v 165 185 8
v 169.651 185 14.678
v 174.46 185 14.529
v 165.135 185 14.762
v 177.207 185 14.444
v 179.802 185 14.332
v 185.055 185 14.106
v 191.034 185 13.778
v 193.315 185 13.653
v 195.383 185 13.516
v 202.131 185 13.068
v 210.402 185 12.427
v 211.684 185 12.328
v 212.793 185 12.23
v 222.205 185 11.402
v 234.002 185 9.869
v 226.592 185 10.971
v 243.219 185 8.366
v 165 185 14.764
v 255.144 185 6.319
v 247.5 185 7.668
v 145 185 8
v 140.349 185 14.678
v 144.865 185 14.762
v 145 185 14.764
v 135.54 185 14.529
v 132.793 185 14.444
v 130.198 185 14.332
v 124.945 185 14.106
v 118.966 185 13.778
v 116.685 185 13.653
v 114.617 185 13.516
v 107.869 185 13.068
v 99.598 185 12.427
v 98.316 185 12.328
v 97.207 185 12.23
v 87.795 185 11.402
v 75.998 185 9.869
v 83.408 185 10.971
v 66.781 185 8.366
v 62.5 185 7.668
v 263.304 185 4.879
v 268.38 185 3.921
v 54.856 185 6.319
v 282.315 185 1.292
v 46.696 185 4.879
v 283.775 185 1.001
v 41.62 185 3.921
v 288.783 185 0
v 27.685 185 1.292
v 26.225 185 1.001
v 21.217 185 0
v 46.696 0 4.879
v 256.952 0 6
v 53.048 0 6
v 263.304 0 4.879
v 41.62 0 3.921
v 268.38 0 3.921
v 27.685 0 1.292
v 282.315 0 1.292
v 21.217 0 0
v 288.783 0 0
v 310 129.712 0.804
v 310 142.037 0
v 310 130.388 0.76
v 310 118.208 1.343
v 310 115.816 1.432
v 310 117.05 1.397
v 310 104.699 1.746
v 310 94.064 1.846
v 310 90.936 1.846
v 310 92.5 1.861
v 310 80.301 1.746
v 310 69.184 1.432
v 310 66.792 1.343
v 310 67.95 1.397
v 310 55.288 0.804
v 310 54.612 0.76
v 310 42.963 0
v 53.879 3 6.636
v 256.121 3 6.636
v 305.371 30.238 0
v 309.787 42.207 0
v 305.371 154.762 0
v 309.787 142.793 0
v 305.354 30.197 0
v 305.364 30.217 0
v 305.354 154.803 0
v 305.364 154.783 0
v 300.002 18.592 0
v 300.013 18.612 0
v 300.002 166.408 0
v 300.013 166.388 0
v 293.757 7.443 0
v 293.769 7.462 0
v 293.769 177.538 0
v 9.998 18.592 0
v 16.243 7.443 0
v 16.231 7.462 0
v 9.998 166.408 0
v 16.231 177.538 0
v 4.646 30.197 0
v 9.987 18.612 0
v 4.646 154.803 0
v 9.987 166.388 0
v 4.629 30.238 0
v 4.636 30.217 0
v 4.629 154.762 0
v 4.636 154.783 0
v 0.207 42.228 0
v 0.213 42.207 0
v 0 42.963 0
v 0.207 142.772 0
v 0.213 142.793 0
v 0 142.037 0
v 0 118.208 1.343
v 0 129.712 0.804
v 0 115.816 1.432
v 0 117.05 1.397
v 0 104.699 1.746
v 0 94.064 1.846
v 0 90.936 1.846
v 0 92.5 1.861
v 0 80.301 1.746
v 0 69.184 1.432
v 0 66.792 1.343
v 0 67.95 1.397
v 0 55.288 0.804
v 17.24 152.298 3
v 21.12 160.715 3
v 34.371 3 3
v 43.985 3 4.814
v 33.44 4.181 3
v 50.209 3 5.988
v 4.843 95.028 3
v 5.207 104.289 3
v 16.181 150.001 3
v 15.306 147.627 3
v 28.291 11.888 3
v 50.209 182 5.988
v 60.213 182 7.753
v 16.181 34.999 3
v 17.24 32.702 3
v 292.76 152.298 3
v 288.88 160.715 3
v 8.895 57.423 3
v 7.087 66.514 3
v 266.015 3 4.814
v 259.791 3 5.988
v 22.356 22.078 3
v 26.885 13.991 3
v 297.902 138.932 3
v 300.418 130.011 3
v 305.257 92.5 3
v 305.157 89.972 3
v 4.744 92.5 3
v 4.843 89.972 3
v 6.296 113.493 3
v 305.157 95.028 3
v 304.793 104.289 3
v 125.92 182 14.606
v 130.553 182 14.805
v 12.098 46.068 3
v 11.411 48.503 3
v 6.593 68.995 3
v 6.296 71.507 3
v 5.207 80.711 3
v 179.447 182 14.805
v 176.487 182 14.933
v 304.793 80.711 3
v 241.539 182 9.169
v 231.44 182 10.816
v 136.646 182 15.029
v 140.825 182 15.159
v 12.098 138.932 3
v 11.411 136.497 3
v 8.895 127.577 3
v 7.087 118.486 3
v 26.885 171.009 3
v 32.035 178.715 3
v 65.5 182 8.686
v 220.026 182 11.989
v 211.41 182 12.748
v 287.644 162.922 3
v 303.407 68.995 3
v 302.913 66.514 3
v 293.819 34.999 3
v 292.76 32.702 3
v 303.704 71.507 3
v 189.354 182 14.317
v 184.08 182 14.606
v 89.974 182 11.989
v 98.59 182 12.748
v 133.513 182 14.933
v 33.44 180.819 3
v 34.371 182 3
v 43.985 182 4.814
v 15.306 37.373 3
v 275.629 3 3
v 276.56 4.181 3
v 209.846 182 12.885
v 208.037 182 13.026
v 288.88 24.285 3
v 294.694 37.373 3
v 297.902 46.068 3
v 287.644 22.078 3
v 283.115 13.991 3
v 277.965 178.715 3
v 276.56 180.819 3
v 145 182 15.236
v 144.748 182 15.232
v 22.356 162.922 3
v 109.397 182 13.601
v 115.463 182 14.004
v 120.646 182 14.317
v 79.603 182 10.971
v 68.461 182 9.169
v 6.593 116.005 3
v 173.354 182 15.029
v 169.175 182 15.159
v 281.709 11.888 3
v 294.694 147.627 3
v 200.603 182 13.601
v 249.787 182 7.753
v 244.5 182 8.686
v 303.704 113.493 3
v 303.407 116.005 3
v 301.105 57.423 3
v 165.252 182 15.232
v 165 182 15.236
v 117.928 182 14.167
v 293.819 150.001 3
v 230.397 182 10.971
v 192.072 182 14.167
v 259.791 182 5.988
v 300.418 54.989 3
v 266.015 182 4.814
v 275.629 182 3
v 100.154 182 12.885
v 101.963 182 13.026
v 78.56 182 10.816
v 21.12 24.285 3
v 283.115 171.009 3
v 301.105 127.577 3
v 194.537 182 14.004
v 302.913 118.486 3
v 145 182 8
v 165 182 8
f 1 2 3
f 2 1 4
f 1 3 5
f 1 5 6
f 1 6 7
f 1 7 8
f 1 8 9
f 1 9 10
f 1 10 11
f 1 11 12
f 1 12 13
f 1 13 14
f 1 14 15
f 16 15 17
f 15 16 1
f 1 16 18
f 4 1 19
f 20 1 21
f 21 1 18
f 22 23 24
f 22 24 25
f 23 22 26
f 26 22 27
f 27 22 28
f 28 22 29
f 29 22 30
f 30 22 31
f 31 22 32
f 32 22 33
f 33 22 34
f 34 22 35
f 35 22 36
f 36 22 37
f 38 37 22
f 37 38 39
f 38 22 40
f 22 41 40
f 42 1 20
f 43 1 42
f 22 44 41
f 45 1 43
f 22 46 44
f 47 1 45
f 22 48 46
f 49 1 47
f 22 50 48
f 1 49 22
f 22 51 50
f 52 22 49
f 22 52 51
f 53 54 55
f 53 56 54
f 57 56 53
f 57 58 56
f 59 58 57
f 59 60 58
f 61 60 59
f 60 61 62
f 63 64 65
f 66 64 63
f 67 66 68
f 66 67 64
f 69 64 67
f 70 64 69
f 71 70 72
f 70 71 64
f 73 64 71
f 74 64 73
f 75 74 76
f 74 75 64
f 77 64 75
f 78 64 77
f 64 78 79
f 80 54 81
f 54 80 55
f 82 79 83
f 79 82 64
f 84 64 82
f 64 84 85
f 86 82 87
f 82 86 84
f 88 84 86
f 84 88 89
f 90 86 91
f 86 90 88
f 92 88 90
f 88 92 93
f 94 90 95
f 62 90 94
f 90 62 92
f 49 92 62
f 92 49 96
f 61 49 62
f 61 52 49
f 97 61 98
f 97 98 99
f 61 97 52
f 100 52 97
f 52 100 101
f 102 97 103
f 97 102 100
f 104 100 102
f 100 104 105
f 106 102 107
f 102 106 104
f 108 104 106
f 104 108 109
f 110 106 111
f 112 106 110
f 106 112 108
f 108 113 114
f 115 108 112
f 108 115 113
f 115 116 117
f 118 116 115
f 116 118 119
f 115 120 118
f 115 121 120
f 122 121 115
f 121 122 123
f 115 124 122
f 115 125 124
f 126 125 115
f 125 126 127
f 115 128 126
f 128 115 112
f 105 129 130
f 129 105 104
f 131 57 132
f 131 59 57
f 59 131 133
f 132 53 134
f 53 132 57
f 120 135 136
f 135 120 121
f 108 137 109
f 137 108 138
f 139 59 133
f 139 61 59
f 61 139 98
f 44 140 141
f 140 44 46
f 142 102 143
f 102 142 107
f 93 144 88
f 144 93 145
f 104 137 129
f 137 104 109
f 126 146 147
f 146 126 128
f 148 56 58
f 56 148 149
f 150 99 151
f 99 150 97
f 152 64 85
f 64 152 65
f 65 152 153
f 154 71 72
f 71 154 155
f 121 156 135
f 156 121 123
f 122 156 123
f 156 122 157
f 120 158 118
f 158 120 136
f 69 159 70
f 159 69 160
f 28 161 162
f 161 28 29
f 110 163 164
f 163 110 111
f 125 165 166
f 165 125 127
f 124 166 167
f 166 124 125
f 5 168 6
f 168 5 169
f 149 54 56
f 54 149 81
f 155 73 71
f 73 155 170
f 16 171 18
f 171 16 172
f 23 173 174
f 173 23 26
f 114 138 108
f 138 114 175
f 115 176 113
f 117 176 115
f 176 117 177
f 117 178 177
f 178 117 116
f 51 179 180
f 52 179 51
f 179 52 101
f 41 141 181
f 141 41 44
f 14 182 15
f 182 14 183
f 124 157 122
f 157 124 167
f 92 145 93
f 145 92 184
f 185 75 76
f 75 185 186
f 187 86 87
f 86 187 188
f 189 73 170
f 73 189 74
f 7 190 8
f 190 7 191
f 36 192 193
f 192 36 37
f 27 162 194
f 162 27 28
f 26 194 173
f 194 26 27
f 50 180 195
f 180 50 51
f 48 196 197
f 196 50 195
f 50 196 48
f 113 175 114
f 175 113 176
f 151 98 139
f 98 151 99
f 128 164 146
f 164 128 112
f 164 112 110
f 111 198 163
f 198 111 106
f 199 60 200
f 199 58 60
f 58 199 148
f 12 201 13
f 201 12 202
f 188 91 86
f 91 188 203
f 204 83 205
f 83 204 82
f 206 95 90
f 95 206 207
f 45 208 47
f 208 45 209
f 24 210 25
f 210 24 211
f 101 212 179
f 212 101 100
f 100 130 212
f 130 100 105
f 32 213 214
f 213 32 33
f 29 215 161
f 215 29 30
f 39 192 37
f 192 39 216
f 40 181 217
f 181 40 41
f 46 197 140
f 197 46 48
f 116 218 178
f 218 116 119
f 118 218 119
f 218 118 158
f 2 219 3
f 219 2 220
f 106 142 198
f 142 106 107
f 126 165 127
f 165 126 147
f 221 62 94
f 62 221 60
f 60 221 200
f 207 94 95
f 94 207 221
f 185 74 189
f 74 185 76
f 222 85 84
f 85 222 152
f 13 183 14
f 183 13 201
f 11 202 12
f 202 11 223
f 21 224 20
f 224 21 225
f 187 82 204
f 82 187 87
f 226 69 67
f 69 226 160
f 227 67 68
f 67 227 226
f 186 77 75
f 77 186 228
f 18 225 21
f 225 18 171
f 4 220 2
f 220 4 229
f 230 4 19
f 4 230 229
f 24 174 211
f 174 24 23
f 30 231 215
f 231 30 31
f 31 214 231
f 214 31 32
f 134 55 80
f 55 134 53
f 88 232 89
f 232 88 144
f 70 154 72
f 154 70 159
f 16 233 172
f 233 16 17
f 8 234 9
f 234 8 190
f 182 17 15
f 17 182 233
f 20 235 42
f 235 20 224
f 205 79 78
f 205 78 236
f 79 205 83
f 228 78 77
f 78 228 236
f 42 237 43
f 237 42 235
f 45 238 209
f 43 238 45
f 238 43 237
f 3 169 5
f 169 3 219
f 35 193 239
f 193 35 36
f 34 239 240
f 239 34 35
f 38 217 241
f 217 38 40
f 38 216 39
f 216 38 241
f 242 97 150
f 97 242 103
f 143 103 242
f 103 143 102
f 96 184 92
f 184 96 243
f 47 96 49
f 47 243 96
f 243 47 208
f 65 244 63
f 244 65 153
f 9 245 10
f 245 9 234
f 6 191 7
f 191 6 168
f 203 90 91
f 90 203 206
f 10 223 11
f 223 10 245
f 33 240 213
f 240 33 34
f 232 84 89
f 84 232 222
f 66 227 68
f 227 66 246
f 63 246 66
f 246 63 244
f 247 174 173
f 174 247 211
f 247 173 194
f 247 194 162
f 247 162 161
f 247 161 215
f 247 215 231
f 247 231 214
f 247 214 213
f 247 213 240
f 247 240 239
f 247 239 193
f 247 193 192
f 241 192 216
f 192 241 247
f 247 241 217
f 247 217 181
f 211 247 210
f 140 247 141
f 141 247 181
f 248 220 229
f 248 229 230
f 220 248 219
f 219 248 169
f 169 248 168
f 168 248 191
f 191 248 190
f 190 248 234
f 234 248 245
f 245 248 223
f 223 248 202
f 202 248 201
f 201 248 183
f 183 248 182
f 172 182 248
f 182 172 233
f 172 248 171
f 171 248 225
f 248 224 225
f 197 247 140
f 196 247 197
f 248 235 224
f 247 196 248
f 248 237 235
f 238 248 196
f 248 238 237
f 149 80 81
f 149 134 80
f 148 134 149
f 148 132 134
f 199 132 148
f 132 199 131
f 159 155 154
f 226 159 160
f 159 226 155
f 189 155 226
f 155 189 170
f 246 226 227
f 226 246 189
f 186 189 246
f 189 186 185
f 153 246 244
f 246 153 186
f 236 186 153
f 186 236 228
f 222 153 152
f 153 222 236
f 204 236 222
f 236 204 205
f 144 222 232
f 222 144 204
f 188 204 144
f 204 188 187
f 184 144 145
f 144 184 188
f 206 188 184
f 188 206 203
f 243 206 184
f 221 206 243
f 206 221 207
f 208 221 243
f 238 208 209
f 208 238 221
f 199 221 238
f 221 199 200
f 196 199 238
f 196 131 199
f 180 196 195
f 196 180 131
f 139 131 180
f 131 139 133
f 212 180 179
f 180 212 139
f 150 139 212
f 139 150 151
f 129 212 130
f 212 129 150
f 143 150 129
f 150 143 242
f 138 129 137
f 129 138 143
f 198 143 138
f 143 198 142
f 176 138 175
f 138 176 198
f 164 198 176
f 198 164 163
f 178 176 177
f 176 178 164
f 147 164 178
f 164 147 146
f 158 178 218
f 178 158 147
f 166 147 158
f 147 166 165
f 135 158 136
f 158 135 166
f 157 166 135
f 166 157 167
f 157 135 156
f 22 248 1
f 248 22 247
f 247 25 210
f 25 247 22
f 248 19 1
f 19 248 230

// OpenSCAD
// ============================================================
//  CRAYXUS Guandan Keyboard — Gravity Planet Base
//  重力星球底座 — 带角度键盘托架
//  适配: Bambu A1 (256×256mm), 分左右两半打印
// ============================================================

$fn = 80;

// ===== 键盘尺寸 =====
kb_w       = 290;      // 键盘总宽 (拼合后)
kb_d       = 160;      // 键盘总深
plate_t    = 3.0;      // 定位板厚度

// ===== 底座参数 =====
base_w     = 310;      // 底座宽 (比键盘宽20mm)
base_d     = 185;      // 底座深
tilt_angle = 12;       // 倾斜角度 (度)
base_h_back = 45;      // 后端高度
base_h_front = 6;      // 前端高度 (唇边)
wall       = 3.0;      // 壁厚
lip_h      = 4.0;      // 前唇高度 (防滑)

// ===== 星球曲面 =====
sphere_r   = 600;      // 底面球面半径 (越大越平缓)

// ===== 分割 =====
split_x    = base_w / 2;

// ===== 卡扣 =====
tab_w      = 4.0;
tab_d      = 18.0;
tab_tol    = 0.15;
n_tabs     = 3;

// ===== 派生 =====
side_pad   = (base_w - kb_w) / 2;
front_pad  = (base_d - kb_d) / 2;

// ==========================================================
//  星球底面 — 大球面切割出弧形底
// ==========================================================
module planet_curve(w, d, h) {
    // 用一个大球和长方体的交集做弧形底
    intersection() {
        // 原始楔形
        cube([w, d, h]);
        // 球面 (球心在底面下方)
        translate([w/2, d/2, -sphere_r + h * 0.7])
            sphere(r = sphere_r);
    }
}

// ==========================================================
//  楔形主体 — 前低后高的倾斜托架
// ==========================================================
module wedge_body(w, d) {
    // 后端高, 前端低
    hull() {
        // 前面底边
        translate([0, 0, 0])
            cube([w, 1, base_h_front]);
        // 后面底边
        translate([0, d - 1, 0])
            cube([w, 1, base_h_back]);
    }
}

// ==========================================================
//  键盘凹槽 — 键盘嵌入的凹坑
// ==========================================================
module kb_recess(w, d) {
    // 倾斜的凹槽, 深度=定位板厚度+1mm余量
    recess_d = plate_t + 1.5;
    hull() {
        // 前端
        translate([side_pad, front_pad, base_h_front - recess_d + lip_h])
            cube([kb_w, 1, recess_d]);
        // 后端
        translate([side_pad, front_pad + kb_d - 1, base_h_back - recess_d])
            cube([kb_w, 1, recess_d + 1]);
    }
}

// ==========================================================
//  理线槽 — 后方USB线出口
// ==========================================================
module cable_channel() {
    // 后部中央开槽
    translate([base_w/2 - 10, base_d - wall - 1, 8])
        cube([20, wall + 2, 12]);
}

// ==========================================================
//  防滑纹理 — 底部同心圆环
// ==========================================================
module grip_rings() {
    for (i = [1 : 5]) {
        r = i * 20;
        difference() {
            translate([base_w/2, base_d/2, 0])
                cylinder(r = r, h = 0.6);
            translate([base_w/2, base_d/2, -0.1])
                cylinder(r = r - 1.2, h = 0.8);
        }
    }
}

// ==========================================================
//  完整底座 (单半)
// ==========================================================
module base_half(side = "left") {
    is_left = (side == "left");
    clip_x = is_left ? 0 : split_x;
    clip_w = is_left ? split_x : base_w - split_x;

    difference() {
        union() {
            // 主体: 楔形 + 星球弧面底
            intersection() {
                wedge_body(base_w, base_d);
                // 星球弧面 — 底面微弧
                translate([base_w/2, base_d/2, -sphere_r + base_h_back * 0.5])
                    sphere(r = sphere_r);
            }

            // 前唇 (防止键盘前滑)
            translate([side_pad, front_pad - 2, base_h_front])
                cube([kb_w, 4, lip_h]);

            // 后挡 (轻微凸起)
            translate([side_pad, front_pad + kb_d, base_h_back - plate_t - 1])
                cube([kb_w, 3, plate_t + 2]);

            // 卡扣 (左半凸出)
            if (is_left) {
                tab_spacing = (base_d - n_tabs * tab_d) / (n_tabs + 1);
                for (i = [0 : n_tabs - 1]) {
                    ty = tab_spacing * (i + 1) + tab_d * i;
                    // 计算此处高度 (楔形插值)
                    frac = (ty + tab_d/2) / base_d;
                    local_h = base_h_front + (base_h_back - base_h_front) * frac;
                    translate([split_x, ty, 0])
                        cube([tab_w, tab_d, local_h * 0.8]);
                }
            }
        }

        // 键盘凹槽
        kb_recess(base_w, base_d);

        // 内腔掏空 (省料, 留壁厚)
        translate([wall, wall, wall])
            wedge_body(base_w - 2*wall, base_d - 2*wall);

        // 理线槽
        cable_channel();

        // 卡槽 (右半凹进)
        if (!is_left) {
            tab_spacing = (base_d - n_tabs * tab_d) / (n_tabs + 1);
            slot_w = tab_w + tab_tol * 2;
            slot_d = tab_d + tab_tol * 2;
            for (i = [0 : n_tabs - 1]) {
                ty = tab_spacing * (i + 1) + tab_d * i - tab_tol;
                frac = (ty + tab_d/2) / base_d;
                local_h = base_h_front + (base_h_back - base_h_front) * frac;
                translate([split_x - slot_w, ty, -0.01])
                    cube([slot_w + 0.01, slot_d, local_h * 0.8 + 0.02]);
            }
        }

        // 切半
        if (is_left) {
            translate([split_x + tab_w + 0.01, -1, -1])
                cube([base_w, base_d + 2, base_h_back + 20]);
        } else {
            translate([-base_w + split_x - 0.01, -1, -1])
                cube([base_w, base_d + 2, base_h_back + 20]);
        }
    }

    // 底部防滑圆环 (只在各自半边范围)
    intersection() {
        grip_rings();
        translate([clip_x, 0, 0])
            cube([clip_w, base_d, 1]);
    }
}

// ==========================================================
//  装饰: 星球环 (土星环风格, 底座侧面)
// ==========================================================
module planet_ring() {
    translate([base_w/2, base_d/2, base_h_back * 0.3])
    rotate([90, 0, 0])
    difference() {
        cylinder(r = base_d/2 + 5, h = 2, center = true);
        cylinder(r = base_d/2 - 3, h = 3, center = true);
    }
}

// ==========================================================
//  渲染控制
// ==========================================================
part = 0;  // 0=预览, 1=左半, 2=右半

if (part == 0) {
    // 预览: 两半拼合 + 透明键盘轮廓
    color([0.15, 0.15, 0.18]) base_half("left");
    color([0.15, 0.15, 0.18]) base_half("right");

    // 键盘轮廓 (透明参考)
    %translate([side_pad, front_pad, base_h_front + lip_h])
        rotate([atan2(base_h_back - base_h_front - lip_h, kb_d), 0, 0])
            cube([kb_w, kb_d, 5]);
}
if (part == 1) base_half("left");
if (part == 2) base_half("right");
